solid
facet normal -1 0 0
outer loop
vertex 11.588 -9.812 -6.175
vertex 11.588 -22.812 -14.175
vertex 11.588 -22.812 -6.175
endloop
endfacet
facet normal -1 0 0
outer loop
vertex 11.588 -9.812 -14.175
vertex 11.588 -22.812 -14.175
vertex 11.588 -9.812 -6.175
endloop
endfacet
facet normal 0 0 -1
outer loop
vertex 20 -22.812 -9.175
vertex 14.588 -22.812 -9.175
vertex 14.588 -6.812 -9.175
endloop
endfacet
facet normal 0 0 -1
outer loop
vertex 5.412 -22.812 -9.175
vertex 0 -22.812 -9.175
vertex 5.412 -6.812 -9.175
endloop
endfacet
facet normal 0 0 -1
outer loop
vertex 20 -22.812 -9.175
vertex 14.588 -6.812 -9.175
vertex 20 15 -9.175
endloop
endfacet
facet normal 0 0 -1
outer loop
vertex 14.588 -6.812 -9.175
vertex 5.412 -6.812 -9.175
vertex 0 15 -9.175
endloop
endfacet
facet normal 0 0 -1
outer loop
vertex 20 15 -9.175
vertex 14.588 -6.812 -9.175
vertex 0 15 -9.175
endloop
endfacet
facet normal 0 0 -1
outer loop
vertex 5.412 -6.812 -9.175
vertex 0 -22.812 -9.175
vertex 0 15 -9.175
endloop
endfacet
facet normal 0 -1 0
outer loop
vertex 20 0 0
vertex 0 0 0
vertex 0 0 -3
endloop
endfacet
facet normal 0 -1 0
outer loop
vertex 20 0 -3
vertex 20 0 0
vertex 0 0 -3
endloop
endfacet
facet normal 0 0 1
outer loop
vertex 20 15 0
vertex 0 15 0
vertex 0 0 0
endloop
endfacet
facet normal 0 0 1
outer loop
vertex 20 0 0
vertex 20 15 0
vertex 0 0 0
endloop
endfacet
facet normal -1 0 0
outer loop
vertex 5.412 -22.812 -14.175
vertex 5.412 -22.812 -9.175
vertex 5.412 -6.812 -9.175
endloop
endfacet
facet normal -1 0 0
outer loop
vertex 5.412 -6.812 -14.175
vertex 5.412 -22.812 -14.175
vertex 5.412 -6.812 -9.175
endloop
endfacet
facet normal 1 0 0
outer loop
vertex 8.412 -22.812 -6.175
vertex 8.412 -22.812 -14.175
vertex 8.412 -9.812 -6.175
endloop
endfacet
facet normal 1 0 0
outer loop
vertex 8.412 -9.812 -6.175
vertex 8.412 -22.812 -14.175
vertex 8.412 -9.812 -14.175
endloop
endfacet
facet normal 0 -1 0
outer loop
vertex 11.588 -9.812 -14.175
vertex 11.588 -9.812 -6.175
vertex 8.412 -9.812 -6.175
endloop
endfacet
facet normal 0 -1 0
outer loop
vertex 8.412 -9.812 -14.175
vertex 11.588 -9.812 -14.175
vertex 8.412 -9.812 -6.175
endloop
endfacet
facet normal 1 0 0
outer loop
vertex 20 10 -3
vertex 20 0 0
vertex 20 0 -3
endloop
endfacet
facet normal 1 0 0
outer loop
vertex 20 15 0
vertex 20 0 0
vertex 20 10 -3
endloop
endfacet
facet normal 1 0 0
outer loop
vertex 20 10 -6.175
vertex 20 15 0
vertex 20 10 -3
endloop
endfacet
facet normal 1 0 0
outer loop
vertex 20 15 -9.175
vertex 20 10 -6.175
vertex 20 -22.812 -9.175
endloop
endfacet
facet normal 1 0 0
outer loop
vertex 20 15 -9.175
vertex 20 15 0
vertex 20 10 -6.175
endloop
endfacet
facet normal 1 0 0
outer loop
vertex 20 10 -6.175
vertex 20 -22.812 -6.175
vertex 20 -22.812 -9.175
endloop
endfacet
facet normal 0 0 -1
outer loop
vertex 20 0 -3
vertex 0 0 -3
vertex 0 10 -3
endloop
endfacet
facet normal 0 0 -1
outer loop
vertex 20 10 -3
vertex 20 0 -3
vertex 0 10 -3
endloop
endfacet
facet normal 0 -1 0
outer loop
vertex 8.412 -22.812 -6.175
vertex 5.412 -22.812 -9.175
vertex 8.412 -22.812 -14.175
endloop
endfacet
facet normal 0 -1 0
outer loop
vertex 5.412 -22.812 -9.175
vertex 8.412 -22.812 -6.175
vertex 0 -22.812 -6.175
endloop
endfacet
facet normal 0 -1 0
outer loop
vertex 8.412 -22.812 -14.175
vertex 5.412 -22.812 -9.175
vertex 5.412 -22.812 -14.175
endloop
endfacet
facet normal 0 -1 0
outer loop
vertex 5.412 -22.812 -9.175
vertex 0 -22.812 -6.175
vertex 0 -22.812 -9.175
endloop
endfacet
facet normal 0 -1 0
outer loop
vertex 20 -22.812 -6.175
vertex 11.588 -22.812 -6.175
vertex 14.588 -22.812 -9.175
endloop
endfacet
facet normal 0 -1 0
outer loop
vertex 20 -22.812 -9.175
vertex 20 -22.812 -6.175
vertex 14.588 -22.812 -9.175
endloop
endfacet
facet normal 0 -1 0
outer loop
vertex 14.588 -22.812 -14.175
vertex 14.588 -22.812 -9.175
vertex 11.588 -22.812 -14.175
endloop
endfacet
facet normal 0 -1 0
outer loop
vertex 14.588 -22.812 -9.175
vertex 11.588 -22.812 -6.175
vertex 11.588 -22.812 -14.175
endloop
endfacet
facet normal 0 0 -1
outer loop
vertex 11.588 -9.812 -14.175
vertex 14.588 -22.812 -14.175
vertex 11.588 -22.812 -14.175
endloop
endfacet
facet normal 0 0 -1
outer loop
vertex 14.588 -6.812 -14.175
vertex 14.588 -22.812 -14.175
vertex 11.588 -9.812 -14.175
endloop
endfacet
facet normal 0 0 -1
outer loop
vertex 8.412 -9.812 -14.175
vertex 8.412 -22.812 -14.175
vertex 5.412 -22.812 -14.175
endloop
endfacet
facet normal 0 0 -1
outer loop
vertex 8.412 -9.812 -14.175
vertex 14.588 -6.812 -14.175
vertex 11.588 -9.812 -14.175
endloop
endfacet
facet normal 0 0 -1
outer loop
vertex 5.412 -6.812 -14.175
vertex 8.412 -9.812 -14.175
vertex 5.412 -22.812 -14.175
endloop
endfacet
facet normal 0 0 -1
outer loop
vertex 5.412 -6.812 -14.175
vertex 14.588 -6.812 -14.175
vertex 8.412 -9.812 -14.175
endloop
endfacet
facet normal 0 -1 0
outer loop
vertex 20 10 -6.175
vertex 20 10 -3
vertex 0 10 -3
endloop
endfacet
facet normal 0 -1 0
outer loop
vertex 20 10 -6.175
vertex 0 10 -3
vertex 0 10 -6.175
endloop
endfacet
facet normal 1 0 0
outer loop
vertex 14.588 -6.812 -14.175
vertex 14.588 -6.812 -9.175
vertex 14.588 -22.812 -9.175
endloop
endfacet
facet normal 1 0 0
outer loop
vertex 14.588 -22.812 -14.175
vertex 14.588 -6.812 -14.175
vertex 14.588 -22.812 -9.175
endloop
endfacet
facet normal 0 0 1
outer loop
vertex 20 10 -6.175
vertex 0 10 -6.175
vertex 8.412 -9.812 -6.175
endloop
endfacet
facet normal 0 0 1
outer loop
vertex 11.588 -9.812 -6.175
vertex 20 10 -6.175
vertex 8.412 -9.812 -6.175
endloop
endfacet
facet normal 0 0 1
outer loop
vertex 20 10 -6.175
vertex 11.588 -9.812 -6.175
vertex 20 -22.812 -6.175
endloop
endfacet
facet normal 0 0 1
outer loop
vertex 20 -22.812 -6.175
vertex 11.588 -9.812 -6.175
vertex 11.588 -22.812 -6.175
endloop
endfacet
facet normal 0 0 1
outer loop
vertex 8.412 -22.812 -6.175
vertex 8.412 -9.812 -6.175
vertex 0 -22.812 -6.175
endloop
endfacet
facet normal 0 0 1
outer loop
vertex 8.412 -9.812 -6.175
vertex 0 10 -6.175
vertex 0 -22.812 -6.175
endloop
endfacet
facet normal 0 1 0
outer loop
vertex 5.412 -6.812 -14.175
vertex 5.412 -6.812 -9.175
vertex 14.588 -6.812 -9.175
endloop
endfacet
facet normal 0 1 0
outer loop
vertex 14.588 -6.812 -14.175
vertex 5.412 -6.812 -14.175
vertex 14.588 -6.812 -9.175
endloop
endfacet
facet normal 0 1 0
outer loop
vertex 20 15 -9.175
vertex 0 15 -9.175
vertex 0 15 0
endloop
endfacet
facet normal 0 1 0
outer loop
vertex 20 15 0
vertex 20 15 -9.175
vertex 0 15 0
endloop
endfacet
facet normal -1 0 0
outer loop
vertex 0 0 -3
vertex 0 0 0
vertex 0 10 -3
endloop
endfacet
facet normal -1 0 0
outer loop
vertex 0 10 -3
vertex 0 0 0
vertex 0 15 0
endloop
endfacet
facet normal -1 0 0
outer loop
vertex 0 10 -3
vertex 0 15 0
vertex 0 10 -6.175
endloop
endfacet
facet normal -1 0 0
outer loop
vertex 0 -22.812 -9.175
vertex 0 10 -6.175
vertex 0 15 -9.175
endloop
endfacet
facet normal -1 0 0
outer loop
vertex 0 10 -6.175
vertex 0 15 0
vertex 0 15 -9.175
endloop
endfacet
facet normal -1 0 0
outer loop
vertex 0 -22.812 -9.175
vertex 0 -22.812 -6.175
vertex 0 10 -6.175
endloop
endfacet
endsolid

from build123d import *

# Parameters (mm, degrees)
BOSS_EXTRUDE1_DEPTH = 20
BOSS_EXTRUDE2_DEPTH = 5
SKETCH3_W           = 3.175
SKETCH3_H           = 13
CUT_EXTRUDE1_DEPTH  = 3


with BuildPart() as part:
    # Sketch1 → Boss-Extrude1 (new body)
    with BuildSketch(Plane(origin=(0, 0, 0), x_dir=(0, 0, -1), z_dir=(1, 0, 0))):
        Polygon((0, 0), (3, 0), (3, 10), (6.175, 10), (6.175, -22.812), (9.175, -22.812), (9.175, 15), (0, 15), align=None)
    extrude(amount=BOSS_EXTRUDE1_DEPTH)

    # Sketch2 → Boss-Extrude2 (add)
    with BuildSketch(Plane(origin=(0, 0, -9.175), x_dir=(-1, 0, 0), z_dir=(0, 0, -1))):
        Polygon((-11.5875, -22.812), (-11.5875, -9.812), (-8.4125, -9.812), (-8.4125, -22.812), (-5.4125, -22.812), (-5.4125, -6.812), (-14.5875, -6.812), (-14.5875, -22.812), align=None)
    extrude(amount=BOSS_EXTRUDE2_DEPTH)

    # Sketch3 → Cut-Extrude1 (cut)
    with BuildSketch(Plane(origin=(0, 0, -9.175), x_dir=(-1, 0, 0), z_dir=(0, 0, -1))):
        with Locations((-10, -16.312)):
            Rectangle(SKETCH3_W, SKETCH3_H)
    extrude(amount=-CUT_EXTRUDE1_DEPTH, mode=Mode.SUBTRACT)


solid = part.part
